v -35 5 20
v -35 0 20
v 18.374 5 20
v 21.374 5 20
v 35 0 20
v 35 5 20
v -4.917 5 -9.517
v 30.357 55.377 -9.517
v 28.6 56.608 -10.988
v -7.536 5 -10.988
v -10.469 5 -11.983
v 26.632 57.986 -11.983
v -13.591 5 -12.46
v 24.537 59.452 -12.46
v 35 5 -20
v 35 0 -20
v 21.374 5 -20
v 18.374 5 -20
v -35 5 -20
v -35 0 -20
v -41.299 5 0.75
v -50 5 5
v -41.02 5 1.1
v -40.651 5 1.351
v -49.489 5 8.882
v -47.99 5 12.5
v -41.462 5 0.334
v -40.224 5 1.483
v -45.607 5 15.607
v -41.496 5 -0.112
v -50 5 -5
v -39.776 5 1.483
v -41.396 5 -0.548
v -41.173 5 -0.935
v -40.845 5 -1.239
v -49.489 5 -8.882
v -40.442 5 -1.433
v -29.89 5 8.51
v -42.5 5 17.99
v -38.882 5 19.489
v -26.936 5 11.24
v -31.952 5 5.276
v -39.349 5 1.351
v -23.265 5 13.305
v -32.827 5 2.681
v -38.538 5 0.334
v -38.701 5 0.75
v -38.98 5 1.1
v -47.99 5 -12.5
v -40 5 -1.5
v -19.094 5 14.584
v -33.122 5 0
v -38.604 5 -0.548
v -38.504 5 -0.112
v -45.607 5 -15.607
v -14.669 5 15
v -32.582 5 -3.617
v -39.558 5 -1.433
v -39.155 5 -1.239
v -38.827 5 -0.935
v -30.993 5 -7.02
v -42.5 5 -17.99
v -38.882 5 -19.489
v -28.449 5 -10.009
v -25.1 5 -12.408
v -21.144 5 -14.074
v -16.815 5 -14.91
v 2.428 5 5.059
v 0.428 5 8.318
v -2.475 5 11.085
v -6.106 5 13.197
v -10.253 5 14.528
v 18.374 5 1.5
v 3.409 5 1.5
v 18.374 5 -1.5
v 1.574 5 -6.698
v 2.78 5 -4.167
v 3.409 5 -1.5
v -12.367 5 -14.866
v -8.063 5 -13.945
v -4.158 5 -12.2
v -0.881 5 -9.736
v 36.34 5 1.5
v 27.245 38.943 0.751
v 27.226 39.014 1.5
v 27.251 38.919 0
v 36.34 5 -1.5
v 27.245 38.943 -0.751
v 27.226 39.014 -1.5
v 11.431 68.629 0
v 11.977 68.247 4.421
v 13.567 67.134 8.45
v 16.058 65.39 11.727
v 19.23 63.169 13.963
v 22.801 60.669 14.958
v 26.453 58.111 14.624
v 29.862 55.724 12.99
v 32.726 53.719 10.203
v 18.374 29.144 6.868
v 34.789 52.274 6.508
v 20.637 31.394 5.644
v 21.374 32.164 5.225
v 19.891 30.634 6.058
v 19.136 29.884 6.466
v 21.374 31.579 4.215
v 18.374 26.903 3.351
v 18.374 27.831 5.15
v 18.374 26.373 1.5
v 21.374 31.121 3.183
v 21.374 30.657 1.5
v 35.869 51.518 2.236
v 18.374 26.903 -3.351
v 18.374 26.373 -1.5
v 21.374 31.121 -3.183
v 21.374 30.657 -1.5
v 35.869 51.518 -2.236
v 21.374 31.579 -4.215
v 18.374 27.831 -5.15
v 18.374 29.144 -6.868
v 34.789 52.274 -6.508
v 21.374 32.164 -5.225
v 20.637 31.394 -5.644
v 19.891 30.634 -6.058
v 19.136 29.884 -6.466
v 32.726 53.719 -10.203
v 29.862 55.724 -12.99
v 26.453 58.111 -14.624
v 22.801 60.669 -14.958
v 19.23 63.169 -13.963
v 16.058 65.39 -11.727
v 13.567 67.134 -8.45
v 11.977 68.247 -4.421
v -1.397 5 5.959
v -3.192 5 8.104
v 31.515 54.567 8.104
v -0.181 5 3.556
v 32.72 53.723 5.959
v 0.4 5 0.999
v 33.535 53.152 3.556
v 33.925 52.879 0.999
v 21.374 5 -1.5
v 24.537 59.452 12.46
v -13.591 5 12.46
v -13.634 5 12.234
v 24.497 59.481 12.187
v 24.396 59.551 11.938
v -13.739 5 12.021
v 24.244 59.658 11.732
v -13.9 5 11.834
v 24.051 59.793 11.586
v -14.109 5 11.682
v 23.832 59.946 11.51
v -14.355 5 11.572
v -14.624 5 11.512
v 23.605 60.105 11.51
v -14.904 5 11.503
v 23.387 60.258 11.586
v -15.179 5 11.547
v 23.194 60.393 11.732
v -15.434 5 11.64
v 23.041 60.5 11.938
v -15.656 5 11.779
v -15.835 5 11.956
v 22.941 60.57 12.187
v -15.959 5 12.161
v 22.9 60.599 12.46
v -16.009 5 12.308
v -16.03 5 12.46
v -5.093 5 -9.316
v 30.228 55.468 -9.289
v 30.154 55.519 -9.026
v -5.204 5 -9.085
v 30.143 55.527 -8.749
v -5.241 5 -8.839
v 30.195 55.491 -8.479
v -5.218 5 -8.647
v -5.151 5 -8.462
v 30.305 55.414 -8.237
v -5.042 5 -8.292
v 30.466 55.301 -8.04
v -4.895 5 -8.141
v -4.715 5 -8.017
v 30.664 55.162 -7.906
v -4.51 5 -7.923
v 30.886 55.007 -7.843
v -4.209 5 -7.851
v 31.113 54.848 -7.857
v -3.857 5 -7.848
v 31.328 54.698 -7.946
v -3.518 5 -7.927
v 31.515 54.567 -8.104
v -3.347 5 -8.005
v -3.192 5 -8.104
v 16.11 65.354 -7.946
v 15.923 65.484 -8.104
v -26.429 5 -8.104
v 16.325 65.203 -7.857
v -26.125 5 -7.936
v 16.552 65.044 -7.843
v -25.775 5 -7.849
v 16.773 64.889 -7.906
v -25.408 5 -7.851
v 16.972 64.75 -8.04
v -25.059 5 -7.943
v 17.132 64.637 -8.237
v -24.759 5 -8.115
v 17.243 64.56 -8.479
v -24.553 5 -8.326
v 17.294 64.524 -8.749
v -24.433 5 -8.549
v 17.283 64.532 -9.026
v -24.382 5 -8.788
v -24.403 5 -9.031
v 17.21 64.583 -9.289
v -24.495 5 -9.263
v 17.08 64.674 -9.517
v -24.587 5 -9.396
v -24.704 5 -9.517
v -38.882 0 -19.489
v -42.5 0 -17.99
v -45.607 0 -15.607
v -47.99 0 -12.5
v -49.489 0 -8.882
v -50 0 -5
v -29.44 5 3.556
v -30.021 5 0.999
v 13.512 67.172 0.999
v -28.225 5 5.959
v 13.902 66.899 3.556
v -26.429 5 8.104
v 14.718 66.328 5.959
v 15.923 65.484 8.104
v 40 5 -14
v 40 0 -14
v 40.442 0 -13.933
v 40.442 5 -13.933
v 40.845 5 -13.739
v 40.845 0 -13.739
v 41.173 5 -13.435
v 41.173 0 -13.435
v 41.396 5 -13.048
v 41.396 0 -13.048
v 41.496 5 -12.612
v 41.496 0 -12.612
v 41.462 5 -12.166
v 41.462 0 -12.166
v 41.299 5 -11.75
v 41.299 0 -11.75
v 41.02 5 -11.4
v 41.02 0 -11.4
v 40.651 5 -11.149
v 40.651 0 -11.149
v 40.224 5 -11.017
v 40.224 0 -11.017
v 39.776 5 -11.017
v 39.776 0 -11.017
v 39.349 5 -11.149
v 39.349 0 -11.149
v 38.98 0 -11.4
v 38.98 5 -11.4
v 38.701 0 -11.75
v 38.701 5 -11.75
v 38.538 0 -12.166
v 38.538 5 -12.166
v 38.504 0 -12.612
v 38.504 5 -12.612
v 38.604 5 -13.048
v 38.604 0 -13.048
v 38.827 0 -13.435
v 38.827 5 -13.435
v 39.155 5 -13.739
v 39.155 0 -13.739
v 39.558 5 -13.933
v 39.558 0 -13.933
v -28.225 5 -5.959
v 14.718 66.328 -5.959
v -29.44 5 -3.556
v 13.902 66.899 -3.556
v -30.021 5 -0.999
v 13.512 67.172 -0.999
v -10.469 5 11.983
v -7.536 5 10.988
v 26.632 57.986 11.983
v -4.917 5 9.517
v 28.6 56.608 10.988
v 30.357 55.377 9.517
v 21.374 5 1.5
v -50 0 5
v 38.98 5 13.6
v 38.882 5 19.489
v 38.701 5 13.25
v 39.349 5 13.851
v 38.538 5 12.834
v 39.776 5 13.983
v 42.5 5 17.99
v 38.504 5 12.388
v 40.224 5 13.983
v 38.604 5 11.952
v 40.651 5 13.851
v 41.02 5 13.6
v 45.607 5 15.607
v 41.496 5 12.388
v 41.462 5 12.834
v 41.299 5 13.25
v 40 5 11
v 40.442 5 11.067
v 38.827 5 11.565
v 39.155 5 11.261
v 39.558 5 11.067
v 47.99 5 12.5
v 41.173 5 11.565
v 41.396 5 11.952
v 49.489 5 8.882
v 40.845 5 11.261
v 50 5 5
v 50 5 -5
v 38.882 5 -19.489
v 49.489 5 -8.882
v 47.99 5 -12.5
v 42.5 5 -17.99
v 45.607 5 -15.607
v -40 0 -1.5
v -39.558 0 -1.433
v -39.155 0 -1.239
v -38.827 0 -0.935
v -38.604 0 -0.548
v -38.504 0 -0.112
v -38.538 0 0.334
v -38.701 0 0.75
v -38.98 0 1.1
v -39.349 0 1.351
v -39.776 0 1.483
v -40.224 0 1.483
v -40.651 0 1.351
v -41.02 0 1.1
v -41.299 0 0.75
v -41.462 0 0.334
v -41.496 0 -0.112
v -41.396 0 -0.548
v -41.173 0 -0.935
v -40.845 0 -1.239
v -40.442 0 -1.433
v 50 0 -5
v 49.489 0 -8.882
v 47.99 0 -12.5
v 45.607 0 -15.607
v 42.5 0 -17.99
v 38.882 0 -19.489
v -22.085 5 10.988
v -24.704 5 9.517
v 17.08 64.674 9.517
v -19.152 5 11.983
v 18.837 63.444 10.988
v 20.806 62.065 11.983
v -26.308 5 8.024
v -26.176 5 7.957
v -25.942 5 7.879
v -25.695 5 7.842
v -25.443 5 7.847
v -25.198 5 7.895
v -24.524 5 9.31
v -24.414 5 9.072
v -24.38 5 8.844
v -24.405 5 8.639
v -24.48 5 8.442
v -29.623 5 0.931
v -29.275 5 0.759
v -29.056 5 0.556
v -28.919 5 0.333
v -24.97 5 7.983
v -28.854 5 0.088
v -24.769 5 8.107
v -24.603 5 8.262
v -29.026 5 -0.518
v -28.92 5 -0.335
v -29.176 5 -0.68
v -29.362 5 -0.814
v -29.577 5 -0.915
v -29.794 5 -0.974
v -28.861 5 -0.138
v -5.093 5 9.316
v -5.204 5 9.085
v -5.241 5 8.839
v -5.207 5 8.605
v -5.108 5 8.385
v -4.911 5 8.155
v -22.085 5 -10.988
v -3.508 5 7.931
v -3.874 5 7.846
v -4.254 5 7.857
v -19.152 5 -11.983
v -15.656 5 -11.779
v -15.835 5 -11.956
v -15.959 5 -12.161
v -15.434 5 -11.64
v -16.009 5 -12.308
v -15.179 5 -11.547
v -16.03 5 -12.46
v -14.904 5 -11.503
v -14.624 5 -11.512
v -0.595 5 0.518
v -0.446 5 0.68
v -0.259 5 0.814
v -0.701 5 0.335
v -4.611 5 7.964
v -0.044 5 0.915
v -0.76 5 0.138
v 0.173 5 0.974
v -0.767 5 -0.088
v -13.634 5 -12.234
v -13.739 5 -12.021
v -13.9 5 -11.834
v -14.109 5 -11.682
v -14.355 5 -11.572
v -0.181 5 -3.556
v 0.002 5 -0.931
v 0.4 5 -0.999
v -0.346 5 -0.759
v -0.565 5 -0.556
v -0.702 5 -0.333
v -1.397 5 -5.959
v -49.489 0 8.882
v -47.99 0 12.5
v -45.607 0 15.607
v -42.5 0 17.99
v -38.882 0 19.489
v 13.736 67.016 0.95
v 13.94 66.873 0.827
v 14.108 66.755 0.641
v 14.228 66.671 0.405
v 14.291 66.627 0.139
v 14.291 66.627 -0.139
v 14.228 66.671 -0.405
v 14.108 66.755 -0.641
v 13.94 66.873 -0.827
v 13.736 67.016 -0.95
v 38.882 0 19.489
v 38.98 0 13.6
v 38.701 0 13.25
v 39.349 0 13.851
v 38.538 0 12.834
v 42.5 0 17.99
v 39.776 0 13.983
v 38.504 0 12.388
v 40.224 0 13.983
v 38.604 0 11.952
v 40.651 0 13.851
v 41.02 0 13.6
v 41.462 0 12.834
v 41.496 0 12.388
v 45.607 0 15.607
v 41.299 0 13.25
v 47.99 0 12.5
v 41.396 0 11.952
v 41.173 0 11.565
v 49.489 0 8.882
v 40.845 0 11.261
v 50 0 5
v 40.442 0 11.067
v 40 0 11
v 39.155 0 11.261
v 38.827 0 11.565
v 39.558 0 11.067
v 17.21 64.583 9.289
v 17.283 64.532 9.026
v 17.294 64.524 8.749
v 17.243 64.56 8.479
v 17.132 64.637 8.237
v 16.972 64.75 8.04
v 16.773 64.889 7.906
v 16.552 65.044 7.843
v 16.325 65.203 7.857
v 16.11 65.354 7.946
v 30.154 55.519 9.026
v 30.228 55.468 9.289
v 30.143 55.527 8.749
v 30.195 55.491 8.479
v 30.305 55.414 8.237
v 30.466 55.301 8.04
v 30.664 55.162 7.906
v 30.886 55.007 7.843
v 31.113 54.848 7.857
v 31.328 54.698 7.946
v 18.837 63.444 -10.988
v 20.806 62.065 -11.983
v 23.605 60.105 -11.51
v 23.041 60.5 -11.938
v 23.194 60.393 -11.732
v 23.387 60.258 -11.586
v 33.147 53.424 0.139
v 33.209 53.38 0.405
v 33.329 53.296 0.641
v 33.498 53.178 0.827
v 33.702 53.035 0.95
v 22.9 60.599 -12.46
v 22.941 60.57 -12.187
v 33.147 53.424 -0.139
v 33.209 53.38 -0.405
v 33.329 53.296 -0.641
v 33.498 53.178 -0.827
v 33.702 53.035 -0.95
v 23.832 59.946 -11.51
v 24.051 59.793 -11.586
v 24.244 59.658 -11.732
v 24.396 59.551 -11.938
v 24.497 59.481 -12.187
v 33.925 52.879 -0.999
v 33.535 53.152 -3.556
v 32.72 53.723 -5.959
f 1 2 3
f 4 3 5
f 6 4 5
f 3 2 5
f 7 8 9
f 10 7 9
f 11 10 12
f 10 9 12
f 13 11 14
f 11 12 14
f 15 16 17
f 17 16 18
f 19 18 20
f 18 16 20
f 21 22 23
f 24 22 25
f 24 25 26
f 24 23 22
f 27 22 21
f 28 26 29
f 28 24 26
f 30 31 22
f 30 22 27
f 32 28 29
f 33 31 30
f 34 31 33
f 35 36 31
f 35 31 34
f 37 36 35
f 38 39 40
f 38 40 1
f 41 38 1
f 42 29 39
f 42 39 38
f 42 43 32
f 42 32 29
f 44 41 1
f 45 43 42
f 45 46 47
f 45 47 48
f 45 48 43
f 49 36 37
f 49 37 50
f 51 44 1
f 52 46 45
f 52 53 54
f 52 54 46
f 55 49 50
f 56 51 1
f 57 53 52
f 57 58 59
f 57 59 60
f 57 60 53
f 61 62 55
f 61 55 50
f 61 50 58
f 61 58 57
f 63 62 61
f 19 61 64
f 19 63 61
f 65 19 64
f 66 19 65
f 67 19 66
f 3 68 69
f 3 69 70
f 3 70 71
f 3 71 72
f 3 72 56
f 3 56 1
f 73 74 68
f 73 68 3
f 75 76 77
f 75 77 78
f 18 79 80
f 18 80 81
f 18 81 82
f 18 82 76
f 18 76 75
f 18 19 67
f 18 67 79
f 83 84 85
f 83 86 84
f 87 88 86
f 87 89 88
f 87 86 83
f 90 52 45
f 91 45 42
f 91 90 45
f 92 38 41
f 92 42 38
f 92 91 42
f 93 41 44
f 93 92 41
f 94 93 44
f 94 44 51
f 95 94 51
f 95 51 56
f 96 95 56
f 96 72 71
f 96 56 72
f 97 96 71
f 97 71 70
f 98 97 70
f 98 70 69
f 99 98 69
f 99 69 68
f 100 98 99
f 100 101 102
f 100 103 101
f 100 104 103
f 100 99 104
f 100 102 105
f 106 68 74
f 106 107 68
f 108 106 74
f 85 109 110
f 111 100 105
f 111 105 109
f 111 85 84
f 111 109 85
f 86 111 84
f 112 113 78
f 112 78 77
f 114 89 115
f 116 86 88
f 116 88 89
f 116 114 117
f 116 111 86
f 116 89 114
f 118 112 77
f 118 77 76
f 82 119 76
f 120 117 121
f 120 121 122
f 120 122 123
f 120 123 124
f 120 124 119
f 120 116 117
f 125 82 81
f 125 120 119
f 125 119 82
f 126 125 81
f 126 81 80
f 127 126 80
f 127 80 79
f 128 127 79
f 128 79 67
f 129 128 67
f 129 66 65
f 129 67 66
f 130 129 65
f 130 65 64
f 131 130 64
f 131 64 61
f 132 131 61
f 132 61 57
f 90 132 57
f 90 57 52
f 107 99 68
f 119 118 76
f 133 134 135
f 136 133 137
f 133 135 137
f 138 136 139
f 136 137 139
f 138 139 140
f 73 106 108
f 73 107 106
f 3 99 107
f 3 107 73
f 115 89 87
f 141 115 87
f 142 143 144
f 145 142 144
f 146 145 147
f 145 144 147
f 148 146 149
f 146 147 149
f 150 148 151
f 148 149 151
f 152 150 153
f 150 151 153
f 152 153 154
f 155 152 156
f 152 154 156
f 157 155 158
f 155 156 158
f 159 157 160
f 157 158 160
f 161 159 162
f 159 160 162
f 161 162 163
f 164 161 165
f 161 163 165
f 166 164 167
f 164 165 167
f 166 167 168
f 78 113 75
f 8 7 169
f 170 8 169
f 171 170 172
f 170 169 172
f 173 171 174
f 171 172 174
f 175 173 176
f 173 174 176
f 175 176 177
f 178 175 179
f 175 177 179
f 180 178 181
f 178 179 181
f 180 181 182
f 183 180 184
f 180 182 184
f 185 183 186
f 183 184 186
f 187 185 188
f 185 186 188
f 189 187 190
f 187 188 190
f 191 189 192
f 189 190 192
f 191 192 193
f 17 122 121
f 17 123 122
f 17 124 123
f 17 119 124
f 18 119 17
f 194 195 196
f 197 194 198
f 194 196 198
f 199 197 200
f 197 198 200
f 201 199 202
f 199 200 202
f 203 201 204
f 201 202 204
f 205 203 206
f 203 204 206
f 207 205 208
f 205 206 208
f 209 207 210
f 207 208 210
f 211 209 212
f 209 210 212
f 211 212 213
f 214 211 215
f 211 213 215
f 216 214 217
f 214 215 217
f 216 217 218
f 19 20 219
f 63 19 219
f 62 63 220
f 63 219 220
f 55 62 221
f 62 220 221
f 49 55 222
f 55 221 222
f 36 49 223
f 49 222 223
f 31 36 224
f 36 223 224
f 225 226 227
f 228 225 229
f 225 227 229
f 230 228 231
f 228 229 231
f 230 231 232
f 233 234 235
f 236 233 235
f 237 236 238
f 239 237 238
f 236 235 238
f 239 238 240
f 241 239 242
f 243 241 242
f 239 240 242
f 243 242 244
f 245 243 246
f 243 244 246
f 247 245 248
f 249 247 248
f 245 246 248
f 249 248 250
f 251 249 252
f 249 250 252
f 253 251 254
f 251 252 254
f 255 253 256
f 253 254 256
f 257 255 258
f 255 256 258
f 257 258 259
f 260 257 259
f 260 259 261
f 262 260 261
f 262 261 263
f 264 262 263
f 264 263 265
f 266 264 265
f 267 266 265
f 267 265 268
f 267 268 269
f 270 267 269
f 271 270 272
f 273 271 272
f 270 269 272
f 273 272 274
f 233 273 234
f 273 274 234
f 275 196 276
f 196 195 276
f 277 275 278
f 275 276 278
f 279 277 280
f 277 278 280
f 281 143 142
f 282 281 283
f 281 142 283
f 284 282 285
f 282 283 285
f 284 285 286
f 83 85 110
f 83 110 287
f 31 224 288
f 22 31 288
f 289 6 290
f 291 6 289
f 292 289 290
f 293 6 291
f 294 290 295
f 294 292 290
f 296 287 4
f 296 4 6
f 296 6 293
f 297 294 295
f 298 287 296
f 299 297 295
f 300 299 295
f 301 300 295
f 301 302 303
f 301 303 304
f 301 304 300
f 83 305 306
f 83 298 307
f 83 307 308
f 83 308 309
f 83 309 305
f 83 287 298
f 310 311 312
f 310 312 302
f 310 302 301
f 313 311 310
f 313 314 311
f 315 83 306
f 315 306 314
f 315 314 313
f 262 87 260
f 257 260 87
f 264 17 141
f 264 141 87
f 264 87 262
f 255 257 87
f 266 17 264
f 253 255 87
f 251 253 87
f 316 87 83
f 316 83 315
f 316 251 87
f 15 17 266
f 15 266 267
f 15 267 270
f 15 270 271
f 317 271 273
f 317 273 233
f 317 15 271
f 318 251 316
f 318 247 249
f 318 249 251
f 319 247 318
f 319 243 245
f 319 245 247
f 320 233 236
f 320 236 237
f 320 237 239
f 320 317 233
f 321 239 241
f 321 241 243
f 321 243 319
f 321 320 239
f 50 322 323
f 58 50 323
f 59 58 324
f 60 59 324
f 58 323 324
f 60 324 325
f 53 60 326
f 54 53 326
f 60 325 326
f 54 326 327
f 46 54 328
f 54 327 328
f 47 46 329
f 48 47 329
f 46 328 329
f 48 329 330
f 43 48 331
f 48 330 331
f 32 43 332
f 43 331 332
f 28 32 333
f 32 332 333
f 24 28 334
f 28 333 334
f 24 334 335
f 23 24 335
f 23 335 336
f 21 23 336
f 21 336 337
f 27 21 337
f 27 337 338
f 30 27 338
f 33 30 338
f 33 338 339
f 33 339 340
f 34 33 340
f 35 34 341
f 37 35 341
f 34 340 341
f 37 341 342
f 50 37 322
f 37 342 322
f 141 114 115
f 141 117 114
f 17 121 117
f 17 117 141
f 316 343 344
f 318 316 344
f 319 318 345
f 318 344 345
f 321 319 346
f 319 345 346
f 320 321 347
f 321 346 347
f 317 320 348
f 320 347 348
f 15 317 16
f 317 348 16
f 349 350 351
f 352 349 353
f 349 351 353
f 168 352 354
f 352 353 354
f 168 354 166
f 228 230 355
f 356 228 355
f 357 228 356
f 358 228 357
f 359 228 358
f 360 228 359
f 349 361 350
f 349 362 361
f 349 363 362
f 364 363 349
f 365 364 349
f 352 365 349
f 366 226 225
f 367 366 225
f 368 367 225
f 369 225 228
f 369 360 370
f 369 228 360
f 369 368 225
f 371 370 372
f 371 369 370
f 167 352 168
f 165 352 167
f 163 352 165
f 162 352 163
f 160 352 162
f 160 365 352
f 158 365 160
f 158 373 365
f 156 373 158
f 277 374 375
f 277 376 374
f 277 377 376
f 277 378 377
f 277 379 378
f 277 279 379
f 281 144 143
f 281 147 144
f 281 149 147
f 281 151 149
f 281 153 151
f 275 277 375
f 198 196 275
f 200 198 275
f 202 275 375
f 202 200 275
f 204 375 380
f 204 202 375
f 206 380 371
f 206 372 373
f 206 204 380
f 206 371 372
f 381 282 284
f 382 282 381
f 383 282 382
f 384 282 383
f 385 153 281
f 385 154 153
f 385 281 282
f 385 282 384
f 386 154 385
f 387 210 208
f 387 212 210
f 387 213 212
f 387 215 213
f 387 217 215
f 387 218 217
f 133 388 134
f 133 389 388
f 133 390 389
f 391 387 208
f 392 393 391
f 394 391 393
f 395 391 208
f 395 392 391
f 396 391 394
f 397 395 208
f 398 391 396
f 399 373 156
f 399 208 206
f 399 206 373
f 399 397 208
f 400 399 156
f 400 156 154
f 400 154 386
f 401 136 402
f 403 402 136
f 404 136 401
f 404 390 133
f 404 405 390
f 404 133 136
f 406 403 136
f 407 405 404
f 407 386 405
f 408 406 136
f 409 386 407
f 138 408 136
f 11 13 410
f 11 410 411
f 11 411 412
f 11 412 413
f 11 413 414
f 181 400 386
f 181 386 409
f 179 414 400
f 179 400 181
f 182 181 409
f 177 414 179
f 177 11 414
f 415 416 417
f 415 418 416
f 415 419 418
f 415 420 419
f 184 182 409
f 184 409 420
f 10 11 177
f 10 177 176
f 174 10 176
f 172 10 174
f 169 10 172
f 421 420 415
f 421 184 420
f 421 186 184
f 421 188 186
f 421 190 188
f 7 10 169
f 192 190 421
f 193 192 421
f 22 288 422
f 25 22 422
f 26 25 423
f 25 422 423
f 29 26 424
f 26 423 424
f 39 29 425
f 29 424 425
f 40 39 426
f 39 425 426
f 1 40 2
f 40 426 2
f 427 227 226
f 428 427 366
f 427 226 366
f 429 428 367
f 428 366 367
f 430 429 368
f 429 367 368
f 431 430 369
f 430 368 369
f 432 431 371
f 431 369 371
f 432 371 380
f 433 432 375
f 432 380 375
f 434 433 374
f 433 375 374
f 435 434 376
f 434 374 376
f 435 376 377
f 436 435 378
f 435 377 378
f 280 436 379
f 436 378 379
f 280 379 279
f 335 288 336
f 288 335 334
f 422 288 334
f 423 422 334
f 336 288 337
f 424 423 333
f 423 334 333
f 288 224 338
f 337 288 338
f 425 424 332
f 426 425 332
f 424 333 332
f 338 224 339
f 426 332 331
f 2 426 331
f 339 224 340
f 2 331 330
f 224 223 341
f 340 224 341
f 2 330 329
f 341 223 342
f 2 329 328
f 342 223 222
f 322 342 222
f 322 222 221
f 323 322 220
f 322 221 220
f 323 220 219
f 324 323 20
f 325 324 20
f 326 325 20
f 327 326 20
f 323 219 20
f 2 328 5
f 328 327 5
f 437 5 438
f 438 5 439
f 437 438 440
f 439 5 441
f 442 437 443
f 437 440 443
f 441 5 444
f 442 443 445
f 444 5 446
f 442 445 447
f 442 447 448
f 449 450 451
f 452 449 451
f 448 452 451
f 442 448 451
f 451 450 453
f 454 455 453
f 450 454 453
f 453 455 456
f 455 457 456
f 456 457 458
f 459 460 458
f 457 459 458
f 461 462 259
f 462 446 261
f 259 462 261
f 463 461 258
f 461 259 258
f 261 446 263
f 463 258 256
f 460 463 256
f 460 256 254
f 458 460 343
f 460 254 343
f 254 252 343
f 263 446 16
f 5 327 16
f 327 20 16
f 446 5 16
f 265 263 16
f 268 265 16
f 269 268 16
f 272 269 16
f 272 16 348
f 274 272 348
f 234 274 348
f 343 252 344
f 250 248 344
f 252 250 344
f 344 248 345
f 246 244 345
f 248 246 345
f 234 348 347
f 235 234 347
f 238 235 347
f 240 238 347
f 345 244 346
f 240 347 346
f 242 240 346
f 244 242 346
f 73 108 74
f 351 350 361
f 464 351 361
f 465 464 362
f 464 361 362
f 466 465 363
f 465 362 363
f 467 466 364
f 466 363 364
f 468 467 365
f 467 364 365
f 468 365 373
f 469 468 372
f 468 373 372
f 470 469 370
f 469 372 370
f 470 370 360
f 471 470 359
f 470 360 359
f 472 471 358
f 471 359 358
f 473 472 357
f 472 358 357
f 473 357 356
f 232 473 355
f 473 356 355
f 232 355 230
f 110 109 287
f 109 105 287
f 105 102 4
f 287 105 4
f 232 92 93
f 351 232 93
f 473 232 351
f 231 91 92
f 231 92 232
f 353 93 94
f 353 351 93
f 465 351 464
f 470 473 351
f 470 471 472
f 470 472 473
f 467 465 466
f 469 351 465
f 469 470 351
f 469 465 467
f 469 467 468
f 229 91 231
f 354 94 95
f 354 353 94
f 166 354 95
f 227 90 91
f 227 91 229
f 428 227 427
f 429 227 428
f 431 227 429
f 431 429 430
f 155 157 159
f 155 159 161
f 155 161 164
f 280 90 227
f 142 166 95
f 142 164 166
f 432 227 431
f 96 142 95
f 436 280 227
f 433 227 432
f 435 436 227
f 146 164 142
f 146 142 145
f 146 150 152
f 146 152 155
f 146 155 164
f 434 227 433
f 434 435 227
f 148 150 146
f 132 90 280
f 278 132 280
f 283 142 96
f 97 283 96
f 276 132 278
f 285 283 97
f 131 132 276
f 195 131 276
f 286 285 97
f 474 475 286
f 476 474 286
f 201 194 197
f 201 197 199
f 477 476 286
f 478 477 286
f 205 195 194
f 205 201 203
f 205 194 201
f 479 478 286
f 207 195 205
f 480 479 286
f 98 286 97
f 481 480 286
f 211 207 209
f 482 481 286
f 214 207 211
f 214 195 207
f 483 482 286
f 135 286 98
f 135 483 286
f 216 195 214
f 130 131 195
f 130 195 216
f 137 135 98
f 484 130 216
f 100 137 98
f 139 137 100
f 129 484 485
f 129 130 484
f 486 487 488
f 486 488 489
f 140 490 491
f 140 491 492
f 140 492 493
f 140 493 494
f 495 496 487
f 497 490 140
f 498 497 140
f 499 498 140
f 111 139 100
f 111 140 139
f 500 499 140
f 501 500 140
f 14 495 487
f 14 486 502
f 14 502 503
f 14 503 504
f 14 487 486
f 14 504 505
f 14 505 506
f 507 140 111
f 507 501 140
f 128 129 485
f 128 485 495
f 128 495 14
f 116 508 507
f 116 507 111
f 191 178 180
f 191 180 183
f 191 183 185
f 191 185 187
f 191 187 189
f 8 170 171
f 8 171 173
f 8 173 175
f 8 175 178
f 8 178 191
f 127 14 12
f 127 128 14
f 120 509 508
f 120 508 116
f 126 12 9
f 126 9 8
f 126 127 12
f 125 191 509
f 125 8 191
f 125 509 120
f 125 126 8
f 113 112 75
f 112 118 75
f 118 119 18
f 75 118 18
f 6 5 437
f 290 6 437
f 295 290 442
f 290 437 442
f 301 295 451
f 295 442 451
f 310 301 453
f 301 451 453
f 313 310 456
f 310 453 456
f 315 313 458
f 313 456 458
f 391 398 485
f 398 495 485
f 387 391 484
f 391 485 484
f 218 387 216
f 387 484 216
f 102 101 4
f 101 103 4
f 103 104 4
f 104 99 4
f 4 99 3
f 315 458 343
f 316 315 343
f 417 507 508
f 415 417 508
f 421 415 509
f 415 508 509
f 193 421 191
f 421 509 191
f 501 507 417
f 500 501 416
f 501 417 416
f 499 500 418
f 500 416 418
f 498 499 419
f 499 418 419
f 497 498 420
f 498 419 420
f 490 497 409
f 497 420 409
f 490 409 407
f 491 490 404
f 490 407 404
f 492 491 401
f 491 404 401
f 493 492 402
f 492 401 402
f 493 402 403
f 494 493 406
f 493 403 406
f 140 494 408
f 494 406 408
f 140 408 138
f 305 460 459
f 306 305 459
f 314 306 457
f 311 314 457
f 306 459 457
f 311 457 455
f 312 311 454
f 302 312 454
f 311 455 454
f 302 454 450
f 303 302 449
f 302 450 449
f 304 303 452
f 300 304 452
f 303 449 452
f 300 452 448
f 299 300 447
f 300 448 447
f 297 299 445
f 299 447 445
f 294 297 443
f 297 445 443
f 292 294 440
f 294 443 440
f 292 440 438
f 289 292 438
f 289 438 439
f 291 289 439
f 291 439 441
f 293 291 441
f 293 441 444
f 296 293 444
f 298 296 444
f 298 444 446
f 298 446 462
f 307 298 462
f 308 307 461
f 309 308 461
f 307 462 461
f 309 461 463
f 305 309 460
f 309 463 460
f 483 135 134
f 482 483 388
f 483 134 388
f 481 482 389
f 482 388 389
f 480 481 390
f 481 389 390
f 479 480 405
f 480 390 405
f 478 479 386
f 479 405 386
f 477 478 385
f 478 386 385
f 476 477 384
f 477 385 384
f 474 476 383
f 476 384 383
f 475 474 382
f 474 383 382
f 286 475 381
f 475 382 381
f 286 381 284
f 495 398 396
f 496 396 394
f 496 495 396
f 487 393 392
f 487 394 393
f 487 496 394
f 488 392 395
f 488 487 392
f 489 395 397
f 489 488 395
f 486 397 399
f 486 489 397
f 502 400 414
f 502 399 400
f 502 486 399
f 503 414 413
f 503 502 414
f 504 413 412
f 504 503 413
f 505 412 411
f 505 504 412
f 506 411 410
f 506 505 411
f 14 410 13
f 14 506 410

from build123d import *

# Parameters (mm, degrees)
BOSS_EXTRUDE1_DEPTH = 5
BOSS_EXTRUDE2_REACH = 104.182
SKETCH3_R           = 15
SKETCH3_R_2         = 12.5
BOSS_EXTRUDE3_REACH = 104.182
SKETCH4_R           = 1
CIRPATTERN1_START   = 1.089571064
CIRPATTERN1_DEPTH   = 61.685010975
CIRPATTERN1_START_2 = -13.151834357
CIRPATTERN1_2_DEPTH = 16.804980917
CIRPATTERN1_START_3 = -6.049458183
CIRPATTERN1_3_DEPTH = 9.702604743
RIB2_REACH          = 89.235
SKETCH5_WALL_W      = 196.470282612
SKETCH5_WALL_H      = 3
RIB3_REACH          = 101.962
SKETCH6_WALL_W      = 240.643320444
SKETCH6_WALL_H      = 3
SKETCH7_R           = 1.5
CUT_EXTRUDE1_DEPTH  = 5


with BuildPart() as part:
    # Sketch2 → Boss-Extrude1 (new body)
    with BuildSketch(Plane(origin=(0, 0, 0), x_dir=(1, 0, 0), z_dir=(0, 1, 0))):
        with BuildLine():
            Line((35, 20), (-35, 20))
            ThreePointArc((-35, 20), (-45.606601718, 15.606601718), (-50, 5))
            Line((-50, 5), (-50, -5))
            ThreePointArc((-50, -5), (-45.606601718, -15.606601718), (-35, -20))
            Line((-35, -20), (35, -20))
            ThreePointArc((35, -20), (45.606601718, -15.606601718), (50, -5))
            Line((50, -5), (50, 5))
            ThreePointArc((50, 5), (45.606601718, 15.606601718), (35, 20))
        make_face()
    extrude(amount=BOSS_EXTRUDE1_DEPTH)

    # Boss-Extrude2: up to this plane
    boss_extrude2_end = Plane(origin=(35, 5, 5), z_dir=(0, -1, 0))
    # Sketch3 → Boss-Extrude2 (add, up to the surface)
    with BuildSketch(Plane(origin=(36.006021059, 51.421927207, 0), x_dir=(0, 0, -1), z_dir=(0.5735764363510473, 0.819152044288991, 0)), mode=Mode.PRIVATE) as boss_extrude2_sk1:
        with Locations(Location((0, 15, 0), (0, 0, 90))):
            Circle(SKETCH3_R)
        with Locations(Location((0, 15, 0), (0, 0, 90))):
            Circle(SKETCH3_R_2, mode=Mode.SUBTRACT)
    boss_extrude2_tool1 = split(extrude(boss_extrude2_sk1.sketch, amount=-BOSS_EXTRUDE2_REACH, mode=Mode.PRIVATE), bisect_by=boss_extrude2_end, keep=Keep.BOTH, mode=Mode.PRIVATE)
    add(boss_extrude2_tool1.solids().sort_by_distance((35.658484, 51.665275, 0))[0])

    # Boss-Extrude3: up to this plane
    boss_extrude3_end = Plane(origin=(35, 5, 5), z_dir=(0, -1, 0))
    # Sketch4 → Boss-Extrude3 (add, up to the surface)
    with BuildSketch(Plane(origin=(36.006021059, 51.421927207, 0), x_dir=(0.819152044288991, -0.5735764363510474, 0), z_dir=(0.5735764363510474, 0.819152044288991, 0)), mode=Mode.PRIVATE) as boss_extrude3_sk1:
        with Locations((-15, 12.5)):
            Circle(SKETCH4_R)
    boss_extrude3_tool1 = split(extrude(boss_extrude3_sk1.sketch, amount=-BOSS_EXTRUDE3_REACH, mode=Mode.PRIVATE), bisect_by=boss_extrude3_end, keep=Keep.BOTH, mode=Mode.PRIVATE)
    add(boss_extrude3_tool1.solids().sort_by_distance((23.71874, 60.025574, -12.5))[0])

    # CirPattern1: read off the stored shape, not the designer's step
    # CirPattern1 outline → CirPattern1 (add)
    with BuildSketch(Plane(origin=(0, 0, 0), x_dir=(0.819152044288991, -0.5735764363510472, 0), z_dir=(0.5735764363510472, 0.8191520442889911, 0)).offset(CIRPATTERN1_START)):
        with BuildLine():
            ThreePointArc((-5.482908637, 8.104009624), (-6.161165235, 8.838834765), (-6.895990376, 9.517091363))
            ThreePointArc((-6.895990376, 9.517091363), (-6.868272016, 8.131727984), (-5.482908637, 8.104009624))
        make_face()
        with BuildLine():
            ThreePointArc((-23.104009624, 9.517091363), (-23.838834765, 8.838834765), (-24.517091363, 8.104009624))
            ThreePointArc((-24.517091363, 8.104009624), (-23.131727984, 8.131727984), (-23.104009624, 9.517091363))
        make_face()
        with BuildLine():
            ThreePointArc((-27.46, 0.99919968), (-27.5, 0), (-27.46, -0.99919968))
            ThreePointArc((-27.46, -0.99919968), (-26.5, 0), (-27.46, 0.99919968))
        make_face()
        with BuildLine():
            ThreePointArc((-24.517091363, -8.104009624), (-23.838834765, -8.838834765), (-23.104009624, -9.517091363))
            ThreePointArc((-23.104009624, -9.517091363), (-23.131727984, -8.131727984), (-24.517091363, -8.104009624))
        make_face()
        with BuildLine():
            ThreePointArc((-15.99919968, -12.46), (-15, -12.5), (-14.00080032, -12.46))
            ThreePointArc((-14.00080032, -12.46), (-15, -11.5), (-15.99919968, -12.46))
        make_face()
        with BuildLine():
            ThreePointArc((-6.895990376, -9.517091363), (-6.161165235, -8.838834765), (-5.482908637, -8.104009624))
            ThreePointArc((-5.482908637, -8.104009624), (-6.868272016, -8.131727984), (-6.895990376, -9.517091363))
        make_face()
        with BuildLine():
            ThreePointArc((-2.54, -0.99919968), (-2.5, 0), (-2.54, 0.99919968))
            ThreePointArc((-2.54, 0.99919968), (-3.5, 0), (-2.54, -0.99919968))
        make_face()
    extrude(amount=CIRPATTERN1_DEPTH)

    # CirPattern1 2 outline → CirPattern1 2 (add)
    with BuildSketch(Plane(origin=(0, 0, 0), x_dir=(0.819152044288991, -0.5735764363510472, 0), z_dir=(0.5735764363510472, 0.8191520442889911, 0)).offset(CIRPATTERN1_START_2)):
        with BuildLine():
            ThreePointArc((-23.104009624, 9.517091363), (-23.838834765, 8.838834765), (-24.517091363, 8.104009624))
            ThreePointArc((-24.517091363, 8.104009624), (-23.131727984, 8.131727984), (-23.104009624, 9.517091363))
        make_face()
        with BuildLine():
            ThreePointArc((-27.46, 0.99919968), (-27.5, 0), (-27.46, -0.99919968))
            ThreePointArc((-27.46, -0.99919968), (-26.5, 0), (-27.46, 0.99919968))
        make_face()
        with BuildLine():
            ThreePointArc((-24.517091363, -8.104009624), (-23.838834765, -8.838834765), (-23.104009624, -9.517091363))
            ThreePointArc((-23.104009624, -9.517091363), (-23.131727984, -8.131727984), (-24.517091363, -8.104009624))
        make_face()
    extrude(amount=CIRPATTERN1_2_DEPTH)

    # CirPattern1 3 outline → CirPattern1 3 (add)
    with BuildSketch(Plane(origin=(0, 0, 0), x_dir=(0.819152044288991, -0.5735764363510472, 0), z_dir=(0.5735764363510472, 0.8191520442889911, 0)).offset(CIRPATTERN1_START_3)):
        with BuildLine():
            ThreePointArc((-15.99919968, -12.46), (-15, -12.5), (-14.00080032, -12.46))
            ThreePointArc((-14.00080032, -12.46), (-15, -11.5), (-15.99919968, -12.46))
        make_face()
    extrude(amount=CIRPATTERN1_3_DEPTH)

    # Sketch5 wall → Rib2 (add, up to next)
    with BuildSketch(Plane(origin=(32.411809549, 19.659258263, 0), x_dir=(0.258819045097, -0.96592582629, 0), z_dir=(0.96592582629, 0.258819045097, 0)), mode=Mode.PRIVATE) as rib2_sk1:
        Rectangle(SKETCH5_WALL_W, SKETCH5_WALL_H)
    rib2_tool1 = extrude(rib2_sk1.sketch, amount=-RIB2_REACH, mode=Mode.PRIVATE) - part.part
    add(rib2_tool1.solids().sort_by_distance((32.411809549, 19.659258263, 0))[0])

    # Sketch6 wall → Rib3 (add, up to next)
    with BuildSketch(Plane(origin=(19.874497756, 22.00680033, 10.75), x_dir=(0, -0.878468996126, 0.47779935417), z_dir=(0, -0.47779935417, -0.878468996126)), mode=Mode.PRIVATE) as rib3_sk1:
        Rectangle(SKETCH6_WALL_W, SKETCH6_WALL_H)
    rib3_tool1 = extrude(rib3_sk1.sketch, amount=RIB3_REACH, mode=Mode.PRIVATE) - part.part
    rib3 = rib3_tool1.solids().sort_by_distance((19.874497756, 22.00680033, 10.75))[0]
    add(rib3)

    # Mirror1: Rib3 across plane
    add(rib3.mirror(Plane.XY))

    # Sketch7 → Cut-Extrude1 (cut)
    with BuildSketch(Plane.XZ):
        with Locations(Location((-40, 0, 0), (0, 0, 270))):
            Circle(SKETCH7_R)
        with Locations(Location((40, -12.5, 0), (0, 0, 270))):
            Circle(SKETCH7_R)
        with Locations(Location((40, 12.5, 0), (0, 0, 270))):
            Circle(SKETCH7_R)
    extrude(amount=-CUT_EXTRUDE1_DEPTH, mode=Mode.SUBTRACT)


solid = part.part
